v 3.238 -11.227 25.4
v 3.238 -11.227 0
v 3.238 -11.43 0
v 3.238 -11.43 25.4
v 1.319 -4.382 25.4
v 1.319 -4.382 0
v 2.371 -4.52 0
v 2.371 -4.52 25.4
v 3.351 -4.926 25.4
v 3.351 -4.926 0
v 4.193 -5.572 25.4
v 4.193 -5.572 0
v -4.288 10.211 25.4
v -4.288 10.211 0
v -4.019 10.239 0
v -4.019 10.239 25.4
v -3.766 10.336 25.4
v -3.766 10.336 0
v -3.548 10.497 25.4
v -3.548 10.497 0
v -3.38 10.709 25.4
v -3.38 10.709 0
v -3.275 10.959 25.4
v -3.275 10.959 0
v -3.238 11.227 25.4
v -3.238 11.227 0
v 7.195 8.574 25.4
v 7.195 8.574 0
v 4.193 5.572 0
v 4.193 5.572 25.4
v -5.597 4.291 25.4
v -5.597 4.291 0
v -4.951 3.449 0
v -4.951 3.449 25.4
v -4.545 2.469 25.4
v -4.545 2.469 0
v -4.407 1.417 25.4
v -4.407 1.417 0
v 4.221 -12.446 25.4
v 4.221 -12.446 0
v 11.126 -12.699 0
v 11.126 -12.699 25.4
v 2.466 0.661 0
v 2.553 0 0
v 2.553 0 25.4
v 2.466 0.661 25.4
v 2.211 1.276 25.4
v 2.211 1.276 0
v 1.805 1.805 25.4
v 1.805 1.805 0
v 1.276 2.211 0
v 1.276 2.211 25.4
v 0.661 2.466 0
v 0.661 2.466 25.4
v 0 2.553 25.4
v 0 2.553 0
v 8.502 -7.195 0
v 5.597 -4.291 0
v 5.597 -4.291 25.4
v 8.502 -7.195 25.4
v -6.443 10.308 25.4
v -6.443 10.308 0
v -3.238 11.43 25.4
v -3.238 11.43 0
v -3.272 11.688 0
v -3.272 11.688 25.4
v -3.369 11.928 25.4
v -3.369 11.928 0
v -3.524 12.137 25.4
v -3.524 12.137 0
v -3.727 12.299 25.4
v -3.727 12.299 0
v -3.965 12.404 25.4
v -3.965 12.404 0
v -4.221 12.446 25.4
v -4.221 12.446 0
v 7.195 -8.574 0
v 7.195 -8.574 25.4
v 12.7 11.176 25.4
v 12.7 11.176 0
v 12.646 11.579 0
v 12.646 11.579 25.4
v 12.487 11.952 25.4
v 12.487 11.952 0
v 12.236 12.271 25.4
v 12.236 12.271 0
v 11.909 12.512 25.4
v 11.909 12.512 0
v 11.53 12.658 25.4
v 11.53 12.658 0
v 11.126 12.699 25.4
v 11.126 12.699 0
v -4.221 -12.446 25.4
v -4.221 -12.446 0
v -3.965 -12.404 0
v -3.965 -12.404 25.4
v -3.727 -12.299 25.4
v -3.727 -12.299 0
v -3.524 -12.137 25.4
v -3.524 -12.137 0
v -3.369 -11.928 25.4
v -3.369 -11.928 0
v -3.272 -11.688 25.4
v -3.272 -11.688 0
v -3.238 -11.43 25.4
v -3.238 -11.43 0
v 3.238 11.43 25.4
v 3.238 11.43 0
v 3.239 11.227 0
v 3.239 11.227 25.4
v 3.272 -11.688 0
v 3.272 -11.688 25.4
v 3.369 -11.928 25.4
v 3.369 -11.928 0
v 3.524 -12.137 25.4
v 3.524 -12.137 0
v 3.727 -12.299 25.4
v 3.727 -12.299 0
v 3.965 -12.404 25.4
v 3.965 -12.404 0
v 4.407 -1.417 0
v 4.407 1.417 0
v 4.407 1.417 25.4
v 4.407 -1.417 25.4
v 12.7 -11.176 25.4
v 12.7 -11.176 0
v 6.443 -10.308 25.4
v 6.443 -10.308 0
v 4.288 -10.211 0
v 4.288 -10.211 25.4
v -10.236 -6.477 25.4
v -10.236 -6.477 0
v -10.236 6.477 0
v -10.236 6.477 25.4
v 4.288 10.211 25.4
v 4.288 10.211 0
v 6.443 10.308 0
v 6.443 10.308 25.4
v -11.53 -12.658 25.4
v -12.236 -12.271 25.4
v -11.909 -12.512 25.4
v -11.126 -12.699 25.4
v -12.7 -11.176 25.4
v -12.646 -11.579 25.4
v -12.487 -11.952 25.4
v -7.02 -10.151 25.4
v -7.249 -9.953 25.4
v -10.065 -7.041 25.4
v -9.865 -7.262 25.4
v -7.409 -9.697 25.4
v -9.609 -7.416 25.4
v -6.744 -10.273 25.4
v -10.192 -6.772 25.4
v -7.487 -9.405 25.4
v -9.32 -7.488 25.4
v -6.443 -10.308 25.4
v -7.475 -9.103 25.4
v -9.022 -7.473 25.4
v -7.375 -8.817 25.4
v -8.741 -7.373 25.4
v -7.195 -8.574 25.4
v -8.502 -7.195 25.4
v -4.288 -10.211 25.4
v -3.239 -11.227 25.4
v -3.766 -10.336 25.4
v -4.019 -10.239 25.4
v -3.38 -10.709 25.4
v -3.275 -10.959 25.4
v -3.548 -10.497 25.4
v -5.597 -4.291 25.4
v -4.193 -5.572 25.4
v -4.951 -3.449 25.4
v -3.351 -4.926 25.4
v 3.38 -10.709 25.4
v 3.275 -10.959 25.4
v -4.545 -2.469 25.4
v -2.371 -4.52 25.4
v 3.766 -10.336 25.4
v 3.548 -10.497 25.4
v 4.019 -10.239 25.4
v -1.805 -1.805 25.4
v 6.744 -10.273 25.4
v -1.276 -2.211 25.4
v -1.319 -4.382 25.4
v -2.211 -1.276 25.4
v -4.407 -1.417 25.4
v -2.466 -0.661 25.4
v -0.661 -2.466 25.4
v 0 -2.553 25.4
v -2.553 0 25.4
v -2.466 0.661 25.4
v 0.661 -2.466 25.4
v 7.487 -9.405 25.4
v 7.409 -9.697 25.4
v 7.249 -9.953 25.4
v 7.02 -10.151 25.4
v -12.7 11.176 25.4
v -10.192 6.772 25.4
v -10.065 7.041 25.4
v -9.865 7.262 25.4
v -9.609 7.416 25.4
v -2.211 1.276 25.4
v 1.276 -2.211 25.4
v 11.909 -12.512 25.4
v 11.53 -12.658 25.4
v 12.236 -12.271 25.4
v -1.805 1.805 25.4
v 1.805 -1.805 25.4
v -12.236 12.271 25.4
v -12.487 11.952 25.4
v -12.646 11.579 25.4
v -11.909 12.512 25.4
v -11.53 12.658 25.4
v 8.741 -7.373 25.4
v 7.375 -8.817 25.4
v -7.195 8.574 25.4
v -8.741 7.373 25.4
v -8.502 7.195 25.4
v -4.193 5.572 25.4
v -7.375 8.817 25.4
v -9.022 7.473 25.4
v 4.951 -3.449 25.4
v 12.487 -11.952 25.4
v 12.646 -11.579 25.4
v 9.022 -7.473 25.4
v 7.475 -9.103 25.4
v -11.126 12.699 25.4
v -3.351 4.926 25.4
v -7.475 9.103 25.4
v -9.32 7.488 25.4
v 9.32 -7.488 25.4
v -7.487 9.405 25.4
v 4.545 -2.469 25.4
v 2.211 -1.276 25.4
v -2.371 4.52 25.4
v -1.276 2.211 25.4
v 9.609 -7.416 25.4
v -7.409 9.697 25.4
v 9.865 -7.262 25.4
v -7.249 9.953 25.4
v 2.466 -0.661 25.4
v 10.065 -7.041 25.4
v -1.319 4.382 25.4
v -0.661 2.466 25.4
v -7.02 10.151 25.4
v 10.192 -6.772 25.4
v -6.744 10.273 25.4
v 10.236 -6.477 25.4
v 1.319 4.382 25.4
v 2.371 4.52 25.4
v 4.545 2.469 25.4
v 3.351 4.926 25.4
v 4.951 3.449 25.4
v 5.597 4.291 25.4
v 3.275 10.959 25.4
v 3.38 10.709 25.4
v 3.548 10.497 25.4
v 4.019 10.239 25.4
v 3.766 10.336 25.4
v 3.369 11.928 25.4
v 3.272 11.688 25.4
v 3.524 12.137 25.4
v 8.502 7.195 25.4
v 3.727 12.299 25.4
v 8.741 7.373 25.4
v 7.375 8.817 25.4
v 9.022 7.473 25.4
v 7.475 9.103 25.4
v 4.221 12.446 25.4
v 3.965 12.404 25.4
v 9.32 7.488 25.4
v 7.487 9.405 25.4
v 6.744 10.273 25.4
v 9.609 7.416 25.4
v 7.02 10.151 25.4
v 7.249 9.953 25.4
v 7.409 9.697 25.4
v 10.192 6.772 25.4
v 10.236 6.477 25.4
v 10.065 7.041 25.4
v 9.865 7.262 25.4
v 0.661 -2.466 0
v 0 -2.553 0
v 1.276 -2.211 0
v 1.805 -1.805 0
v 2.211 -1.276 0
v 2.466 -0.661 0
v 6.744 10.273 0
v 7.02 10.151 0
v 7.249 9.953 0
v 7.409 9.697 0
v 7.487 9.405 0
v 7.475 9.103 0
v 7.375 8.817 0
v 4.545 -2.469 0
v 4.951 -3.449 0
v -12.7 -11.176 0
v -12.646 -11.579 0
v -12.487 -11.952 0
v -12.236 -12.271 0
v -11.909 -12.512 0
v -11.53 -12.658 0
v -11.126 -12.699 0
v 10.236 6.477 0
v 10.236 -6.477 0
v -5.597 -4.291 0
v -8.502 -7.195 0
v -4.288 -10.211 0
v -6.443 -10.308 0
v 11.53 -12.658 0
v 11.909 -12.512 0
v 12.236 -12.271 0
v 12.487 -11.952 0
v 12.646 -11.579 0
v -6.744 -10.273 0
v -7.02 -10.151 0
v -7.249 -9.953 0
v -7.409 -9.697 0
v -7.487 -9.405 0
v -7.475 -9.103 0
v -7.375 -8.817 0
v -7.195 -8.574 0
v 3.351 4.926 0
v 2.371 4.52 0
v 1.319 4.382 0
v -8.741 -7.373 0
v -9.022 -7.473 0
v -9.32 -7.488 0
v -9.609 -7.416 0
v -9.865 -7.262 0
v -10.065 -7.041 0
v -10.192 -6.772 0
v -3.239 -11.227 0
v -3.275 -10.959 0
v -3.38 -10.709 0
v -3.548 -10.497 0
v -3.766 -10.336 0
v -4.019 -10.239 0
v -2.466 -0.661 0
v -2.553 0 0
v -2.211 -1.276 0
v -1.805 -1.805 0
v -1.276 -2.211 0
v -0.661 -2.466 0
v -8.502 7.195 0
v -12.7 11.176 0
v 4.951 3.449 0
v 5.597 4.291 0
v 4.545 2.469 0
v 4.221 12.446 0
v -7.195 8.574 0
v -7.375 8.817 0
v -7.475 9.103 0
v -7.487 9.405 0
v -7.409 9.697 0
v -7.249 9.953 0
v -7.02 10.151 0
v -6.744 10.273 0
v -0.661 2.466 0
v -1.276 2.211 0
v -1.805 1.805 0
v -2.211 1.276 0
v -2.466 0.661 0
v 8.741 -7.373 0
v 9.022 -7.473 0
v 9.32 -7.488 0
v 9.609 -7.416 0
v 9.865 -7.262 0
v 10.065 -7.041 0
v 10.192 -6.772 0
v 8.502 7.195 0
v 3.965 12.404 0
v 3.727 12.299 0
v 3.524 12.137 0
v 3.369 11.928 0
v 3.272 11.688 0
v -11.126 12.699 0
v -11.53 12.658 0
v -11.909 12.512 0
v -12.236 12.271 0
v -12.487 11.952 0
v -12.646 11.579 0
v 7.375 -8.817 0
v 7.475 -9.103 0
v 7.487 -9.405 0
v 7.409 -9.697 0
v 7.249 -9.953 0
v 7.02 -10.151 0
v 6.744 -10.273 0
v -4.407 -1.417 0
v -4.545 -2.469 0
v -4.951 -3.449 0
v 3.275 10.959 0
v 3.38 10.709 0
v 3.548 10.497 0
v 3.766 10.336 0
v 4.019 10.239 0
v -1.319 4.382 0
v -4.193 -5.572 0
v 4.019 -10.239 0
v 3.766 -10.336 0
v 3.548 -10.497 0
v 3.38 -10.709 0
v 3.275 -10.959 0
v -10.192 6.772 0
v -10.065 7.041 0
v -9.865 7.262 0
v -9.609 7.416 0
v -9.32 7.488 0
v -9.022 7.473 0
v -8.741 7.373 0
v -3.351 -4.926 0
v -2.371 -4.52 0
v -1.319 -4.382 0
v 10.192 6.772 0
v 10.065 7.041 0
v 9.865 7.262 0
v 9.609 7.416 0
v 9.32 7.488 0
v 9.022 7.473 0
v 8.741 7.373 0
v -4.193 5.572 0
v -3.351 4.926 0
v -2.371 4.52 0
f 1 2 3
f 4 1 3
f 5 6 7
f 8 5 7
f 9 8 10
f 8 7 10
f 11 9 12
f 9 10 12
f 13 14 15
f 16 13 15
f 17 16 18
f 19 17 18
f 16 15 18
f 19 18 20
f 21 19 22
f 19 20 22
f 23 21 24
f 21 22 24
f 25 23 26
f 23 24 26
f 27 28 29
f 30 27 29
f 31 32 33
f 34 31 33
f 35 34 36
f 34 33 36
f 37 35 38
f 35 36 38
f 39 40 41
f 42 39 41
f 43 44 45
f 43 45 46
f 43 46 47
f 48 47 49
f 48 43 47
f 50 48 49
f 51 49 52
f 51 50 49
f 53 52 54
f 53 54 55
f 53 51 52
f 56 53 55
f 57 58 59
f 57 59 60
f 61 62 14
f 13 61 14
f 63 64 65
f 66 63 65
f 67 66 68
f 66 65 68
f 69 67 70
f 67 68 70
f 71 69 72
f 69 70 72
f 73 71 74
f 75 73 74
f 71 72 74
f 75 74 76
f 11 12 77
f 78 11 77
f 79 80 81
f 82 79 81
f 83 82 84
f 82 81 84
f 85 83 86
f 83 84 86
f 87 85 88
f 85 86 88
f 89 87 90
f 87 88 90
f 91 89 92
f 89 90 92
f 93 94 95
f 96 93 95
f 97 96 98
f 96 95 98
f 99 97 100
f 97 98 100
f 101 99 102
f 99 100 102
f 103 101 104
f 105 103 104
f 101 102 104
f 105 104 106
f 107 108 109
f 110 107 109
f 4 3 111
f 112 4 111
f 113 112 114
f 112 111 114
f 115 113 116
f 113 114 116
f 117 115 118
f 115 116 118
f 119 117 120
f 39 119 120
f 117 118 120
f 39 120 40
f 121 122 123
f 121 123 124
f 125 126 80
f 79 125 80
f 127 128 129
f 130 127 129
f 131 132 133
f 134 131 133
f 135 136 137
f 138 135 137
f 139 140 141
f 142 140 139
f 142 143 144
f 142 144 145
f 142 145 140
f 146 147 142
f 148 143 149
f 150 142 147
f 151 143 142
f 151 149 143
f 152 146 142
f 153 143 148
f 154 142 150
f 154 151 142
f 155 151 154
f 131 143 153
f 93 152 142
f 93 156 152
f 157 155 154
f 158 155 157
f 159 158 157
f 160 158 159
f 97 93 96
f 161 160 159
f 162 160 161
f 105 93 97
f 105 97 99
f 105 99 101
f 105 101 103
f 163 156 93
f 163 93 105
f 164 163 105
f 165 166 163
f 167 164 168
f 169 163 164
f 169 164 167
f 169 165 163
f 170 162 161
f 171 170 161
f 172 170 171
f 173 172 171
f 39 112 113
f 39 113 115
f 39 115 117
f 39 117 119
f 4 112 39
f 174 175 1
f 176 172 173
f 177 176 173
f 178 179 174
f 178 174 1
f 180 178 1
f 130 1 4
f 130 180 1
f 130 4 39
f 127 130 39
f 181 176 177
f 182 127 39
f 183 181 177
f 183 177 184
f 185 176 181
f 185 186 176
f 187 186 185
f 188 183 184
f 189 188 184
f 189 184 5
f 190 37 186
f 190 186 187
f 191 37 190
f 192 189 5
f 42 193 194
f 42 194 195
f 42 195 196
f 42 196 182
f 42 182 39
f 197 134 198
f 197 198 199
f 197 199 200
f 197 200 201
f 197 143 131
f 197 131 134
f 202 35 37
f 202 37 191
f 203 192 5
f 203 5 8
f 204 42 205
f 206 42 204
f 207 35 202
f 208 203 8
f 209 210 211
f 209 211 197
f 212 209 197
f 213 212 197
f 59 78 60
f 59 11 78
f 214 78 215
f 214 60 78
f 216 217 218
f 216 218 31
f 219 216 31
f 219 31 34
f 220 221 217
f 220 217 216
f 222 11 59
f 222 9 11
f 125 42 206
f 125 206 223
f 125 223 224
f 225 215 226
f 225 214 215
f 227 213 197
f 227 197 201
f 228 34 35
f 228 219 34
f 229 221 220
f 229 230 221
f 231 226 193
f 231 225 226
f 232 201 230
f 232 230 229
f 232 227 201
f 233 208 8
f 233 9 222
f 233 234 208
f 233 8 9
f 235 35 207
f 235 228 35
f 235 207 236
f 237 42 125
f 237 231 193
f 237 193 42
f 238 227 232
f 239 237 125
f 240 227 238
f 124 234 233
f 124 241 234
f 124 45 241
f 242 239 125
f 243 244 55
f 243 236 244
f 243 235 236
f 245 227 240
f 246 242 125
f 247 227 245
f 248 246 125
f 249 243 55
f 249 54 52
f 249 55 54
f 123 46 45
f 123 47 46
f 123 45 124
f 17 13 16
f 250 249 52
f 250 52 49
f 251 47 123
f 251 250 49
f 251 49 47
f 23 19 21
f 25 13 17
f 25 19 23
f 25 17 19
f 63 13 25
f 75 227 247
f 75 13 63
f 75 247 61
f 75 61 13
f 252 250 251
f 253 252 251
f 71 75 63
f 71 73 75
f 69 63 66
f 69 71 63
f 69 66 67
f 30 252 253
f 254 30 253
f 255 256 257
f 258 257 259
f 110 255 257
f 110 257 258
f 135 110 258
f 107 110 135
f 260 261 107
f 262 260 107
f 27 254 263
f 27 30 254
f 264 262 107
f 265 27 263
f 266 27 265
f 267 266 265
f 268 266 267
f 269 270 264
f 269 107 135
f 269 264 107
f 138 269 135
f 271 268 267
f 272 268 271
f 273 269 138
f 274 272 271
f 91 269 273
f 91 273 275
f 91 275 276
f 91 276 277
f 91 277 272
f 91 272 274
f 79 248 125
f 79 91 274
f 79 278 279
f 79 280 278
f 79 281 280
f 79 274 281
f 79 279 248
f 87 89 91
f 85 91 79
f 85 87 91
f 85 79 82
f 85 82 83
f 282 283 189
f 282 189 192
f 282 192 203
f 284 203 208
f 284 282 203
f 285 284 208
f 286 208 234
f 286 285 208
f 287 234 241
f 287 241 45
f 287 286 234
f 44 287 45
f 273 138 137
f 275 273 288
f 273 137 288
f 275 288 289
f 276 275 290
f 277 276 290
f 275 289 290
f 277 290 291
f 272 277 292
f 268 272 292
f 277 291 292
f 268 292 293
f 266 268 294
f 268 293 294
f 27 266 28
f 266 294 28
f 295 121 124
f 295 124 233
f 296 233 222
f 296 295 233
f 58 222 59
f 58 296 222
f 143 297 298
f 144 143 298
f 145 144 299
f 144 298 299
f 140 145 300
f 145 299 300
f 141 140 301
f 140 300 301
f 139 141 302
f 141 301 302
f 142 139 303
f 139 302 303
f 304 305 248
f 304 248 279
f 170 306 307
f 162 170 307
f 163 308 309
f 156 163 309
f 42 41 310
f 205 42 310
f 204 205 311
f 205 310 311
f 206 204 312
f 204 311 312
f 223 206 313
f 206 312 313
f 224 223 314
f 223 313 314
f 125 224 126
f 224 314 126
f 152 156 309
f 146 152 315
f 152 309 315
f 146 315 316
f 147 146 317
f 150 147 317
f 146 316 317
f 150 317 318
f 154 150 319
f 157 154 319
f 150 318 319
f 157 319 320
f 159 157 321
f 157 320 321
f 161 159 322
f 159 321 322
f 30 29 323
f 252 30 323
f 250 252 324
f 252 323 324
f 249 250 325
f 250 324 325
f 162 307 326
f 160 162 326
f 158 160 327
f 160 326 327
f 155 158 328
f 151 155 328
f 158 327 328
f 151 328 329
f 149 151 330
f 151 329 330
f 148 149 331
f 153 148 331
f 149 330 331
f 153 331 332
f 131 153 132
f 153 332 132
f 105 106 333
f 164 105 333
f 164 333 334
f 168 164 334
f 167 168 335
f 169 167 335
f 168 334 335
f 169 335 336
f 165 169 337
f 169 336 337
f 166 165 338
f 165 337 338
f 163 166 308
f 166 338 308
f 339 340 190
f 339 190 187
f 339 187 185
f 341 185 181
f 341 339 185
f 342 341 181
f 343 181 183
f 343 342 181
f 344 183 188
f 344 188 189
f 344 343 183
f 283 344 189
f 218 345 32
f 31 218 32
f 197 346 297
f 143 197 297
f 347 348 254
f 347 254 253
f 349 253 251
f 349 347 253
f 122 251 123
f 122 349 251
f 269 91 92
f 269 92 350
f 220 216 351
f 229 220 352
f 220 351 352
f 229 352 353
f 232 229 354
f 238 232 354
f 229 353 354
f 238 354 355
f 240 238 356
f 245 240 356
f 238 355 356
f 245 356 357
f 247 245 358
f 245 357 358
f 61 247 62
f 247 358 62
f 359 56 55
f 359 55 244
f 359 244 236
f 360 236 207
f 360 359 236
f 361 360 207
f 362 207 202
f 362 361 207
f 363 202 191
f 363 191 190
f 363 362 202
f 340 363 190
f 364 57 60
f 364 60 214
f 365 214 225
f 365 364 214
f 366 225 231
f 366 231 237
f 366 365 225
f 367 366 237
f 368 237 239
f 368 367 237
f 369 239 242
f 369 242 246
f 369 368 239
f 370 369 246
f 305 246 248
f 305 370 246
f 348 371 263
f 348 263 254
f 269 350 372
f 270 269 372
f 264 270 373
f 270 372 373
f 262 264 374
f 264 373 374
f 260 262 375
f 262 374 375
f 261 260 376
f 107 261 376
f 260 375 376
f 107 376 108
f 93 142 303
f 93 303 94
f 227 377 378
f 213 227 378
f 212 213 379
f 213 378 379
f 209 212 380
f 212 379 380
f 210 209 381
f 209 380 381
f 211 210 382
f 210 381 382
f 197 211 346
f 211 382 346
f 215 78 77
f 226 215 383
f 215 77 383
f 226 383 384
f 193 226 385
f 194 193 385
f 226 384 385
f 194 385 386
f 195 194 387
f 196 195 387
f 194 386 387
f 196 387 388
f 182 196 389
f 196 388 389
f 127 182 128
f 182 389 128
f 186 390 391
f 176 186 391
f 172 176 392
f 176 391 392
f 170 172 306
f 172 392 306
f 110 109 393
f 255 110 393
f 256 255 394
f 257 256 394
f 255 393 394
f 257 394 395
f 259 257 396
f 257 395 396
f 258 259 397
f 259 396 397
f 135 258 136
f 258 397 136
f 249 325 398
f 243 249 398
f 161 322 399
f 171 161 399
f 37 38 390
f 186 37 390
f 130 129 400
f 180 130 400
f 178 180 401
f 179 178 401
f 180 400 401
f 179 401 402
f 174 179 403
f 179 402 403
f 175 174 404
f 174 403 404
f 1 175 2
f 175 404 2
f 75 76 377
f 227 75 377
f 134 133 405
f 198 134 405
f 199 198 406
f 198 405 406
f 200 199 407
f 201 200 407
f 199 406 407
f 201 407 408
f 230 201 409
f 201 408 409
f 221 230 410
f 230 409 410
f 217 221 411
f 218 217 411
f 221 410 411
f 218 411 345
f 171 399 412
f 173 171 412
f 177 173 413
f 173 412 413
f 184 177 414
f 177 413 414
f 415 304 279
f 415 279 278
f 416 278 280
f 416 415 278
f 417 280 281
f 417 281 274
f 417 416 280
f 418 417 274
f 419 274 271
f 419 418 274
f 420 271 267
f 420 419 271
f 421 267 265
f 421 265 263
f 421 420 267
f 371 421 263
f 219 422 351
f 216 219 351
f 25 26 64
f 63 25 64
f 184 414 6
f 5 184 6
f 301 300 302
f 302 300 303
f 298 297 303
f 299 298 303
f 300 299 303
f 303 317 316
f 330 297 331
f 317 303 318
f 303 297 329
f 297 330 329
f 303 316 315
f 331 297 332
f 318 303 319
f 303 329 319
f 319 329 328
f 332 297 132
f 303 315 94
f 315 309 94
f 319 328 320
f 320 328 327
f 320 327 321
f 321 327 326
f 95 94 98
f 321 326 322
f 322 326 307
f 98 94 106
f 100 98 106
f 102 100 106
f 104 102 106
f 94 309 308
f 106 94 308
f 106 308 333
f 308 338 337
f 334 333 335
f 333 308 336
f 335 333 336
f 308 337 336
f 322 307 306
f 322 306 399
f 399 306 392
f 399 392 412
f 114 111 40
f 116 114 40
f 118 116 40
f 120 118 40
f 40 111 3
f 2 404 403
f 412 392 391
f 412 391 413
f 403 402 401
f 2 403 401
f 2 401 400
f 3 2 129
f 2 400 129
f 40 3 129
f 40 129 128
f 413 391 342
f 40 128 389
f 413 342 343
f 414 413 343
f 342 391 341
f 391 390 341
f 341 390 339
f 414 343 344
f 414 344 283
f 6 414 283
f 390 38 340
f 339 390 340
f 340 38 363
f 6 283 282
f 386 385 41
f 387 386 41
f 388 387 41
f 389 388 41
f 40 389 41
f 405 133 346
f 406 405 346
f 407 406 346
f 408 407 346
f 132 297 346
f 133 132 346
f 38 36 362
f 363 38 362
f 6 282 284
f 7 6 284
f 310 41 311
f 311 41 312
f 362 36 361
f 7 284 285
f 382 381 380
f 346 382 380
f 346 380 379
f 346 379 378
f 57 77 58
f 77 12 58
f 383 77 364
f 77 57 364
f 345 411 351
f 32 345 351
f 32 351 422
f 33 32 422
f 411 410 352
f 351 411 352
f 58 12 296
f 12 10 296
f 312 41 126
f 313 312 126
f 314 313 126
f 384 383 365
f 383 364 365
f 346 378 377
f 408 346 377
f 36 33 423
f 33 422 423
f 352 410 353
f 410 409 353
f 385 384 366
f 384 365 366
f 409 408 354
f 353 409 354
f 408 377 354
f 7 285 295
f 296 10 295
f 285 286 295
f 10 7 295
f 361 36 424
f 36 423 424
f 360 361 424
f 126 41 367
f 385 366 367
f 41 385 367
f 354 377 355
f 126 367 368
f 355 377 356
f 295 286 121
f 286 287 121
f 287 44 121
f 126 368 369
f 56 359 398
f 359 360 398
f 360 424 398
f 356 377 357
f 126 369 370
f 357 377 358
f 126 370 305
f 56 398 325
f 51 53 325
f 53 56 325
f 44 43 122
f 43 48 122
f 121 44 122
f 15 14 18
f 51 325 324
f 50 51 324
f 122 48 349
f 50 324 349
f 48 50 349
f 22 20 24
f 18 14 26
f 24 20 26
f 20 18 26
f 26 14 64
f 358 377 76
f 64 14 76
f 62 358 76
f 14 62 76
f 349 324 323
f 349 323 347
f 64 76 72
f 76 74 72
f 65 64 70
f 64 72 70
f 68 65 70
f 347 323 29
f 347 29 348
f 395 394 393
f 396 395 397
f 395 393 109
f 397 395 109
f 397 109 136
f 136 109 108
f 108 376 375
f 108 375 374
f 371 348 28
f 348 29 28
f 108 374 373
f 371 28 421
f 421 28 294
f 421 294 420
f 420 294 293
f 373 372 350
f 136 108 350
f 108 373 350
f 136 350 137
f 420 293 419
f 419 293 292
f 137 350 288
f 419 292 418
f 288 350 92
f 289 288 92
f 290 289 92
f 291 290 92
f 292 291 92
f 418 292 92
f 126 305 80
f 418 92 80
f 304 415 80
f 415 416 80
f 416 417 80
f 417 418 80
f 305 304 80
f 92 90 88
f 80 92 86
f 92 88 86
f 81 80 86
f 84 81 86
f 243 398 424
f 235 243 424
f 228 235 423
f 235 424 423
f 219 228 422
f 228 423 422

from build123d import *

# Parameters (mm, degrees)
EXTRUDE1_DEPTH = 25.4


with BuildPart() as part:
    # Sketch1 → Extrude1 (new body)
    with BuildSketch(Plane.XY):
        with BuildLine():
            Line((11.125675541, 12.699168884), (4.22095036, 12.445641481))
            ThreePointArc((4.22095036, 12.445641481), (3.524314259, 12.136654887), (3.2385, 11.430195559))
            Line((3.2385, 11.430195559), (3.2385, 11.226884683))
            ThreePointArc((3.2385, 11.226884683), (3.548040671, 10.496698941), (4.28804964, 10.21143876))
            Line((4.28804964, 10.21143876), (6.44345036, 10.308051727))
            ThreePointArc((6.44345036, 10.308051727), (7.4091133, 9.696859185), (7.19542049, 8.574185315))
            Line((7.19542049, 8.574185315), (4.193053216, 5.571818041))
            ThreePointArc((4.193053216, 5.571818041), (2.874596726, 4.69085358), (1.319371257, 4.3815))
            Line((1.319371257, 4.3815), (-1.319371257, 4.3815))
            ThreePointArc((-1.319371257, 4.3815), (-2.874596726, 4.69085358), (-4.193053216, 5.571818041))
            Line((-4.193053216, 5.571818041), (-7.19542049, 8.574185315))
            ThreePointArc((-7.19542049, 8.574185315), (-7.4091133, 9.696859185), (-6.44345036, 10.308051727))
            Line((-6.44345036, 10.308051727), (-4.28804964, 10.21143876))
            ThreePointArc((-4.28804964, 10.21143876), (-3.548040671, 10.496698941), (-3.2385, 11.226884683))
            Line((-3.2385, 11.226884683), (-3.2385, 11.430195559))
            ThreePointArc((-3.2385, 11.430195559), (-3.524314259, 12.136654887), (-4.22095036, 12.445641481))
            Line((-4.22095036, 12.445641481), (-11.125675541, 12.699168884))
            ThreePointArc((-11.125675541, 12.699168884), (-12.235688993, 12.271278612), (-12.7, 11.176))
            Line((-12.7, 11.176), (-12.7, 0))
            Line((-12.7, 0), (-12.7, -11.176))
            ThreePointArc((-12.7, -11.176), (-12.235688993, -12.271278612), (-11.125675541, -12.699168884))
            Line((-11.125675541, -12.699168884), (-4.22095036, -12.445641481))
            ThreePointArc((-4.22095036, -12.445641481), (-3.524314259, -12.136654887), (-3.2385, -11.430195559))
            Line((-3.2385, -11.430195559), (-3.2385, -11.226884683))
            ThreePointArc((-3.2385, -11.226884683), (-3.548040671, -10.496698941), (-4.28804964, -10.21143876))
            Line((-4.28804964, -10.21143876), (-6.44345036, -10.308051727))
            ThreePointArc((-6.44345036, -10.308051727), (-7.4091133, -9.696859185), (-7.19542049, -8.574185315))
            Line((-7.19542049, -8.574185315), (-4.193053216, -5.571818041))
            ThreePointArc((-4.193053216, -5.571818041), (-2.874596726, -4.69085358), (-1.319371257, -4.3815))
            Line((-1.319371257, -4.3815), (1.319371257, -4.3815))
            ThreePointArc((1.319371257, -4.3815), (2.874596726, -4.69085358), (4.193053216, -5.571818041))
            Line((4.193053216, -5.571818041), (7.19542049, -8.574185315))
            ThreePointArc((7.19542049, -8.574185315), (7.4091133, -9.696859185), (6.44345036, -10.308051727))
            Line((6.44345036, -10.308051727), (4.28804964, -10.21143876))
            ThreePointArc((4.28804964, -10.21143876), (3.548040671, -10.496698941), (3.2385, -11.226884683))
            Line((3.2385, -11.226884683), (3.2385, -11.430195559))
            ThreePointArc((3.2385, -11.430195559), (3.524314259, -12.136654887), (4.22095036, -12.445641481))
            Line((4.22095036, -12.445641481), (11.125675541, -12.699168884))
            ThreePointArc((11.125675541, -12.699168884), (12.235688993, -12.271278612), (12.7, -11.176))
            Line((12.7, -11.176), (12.7, 0))
            Line((12.7, 0), (12.7, 11.176))
            ThreePointArc((12.7, 11.176), (12.235688993, 12.271278612), (11.125675541, 12.699168884))
        make_face()
        with BuildLine():
            Line((-8.50177951, 7.19542049), (-5.597218041, 4.290859021))
            ThreePointArc((-5.597218041, 4.290859021), (-4.71625358, 2.972402531), (-4.4069, 1.417177062))
            Line((-4.4069, 1.417177062), (-4.4069, -1.417177062))
            ThreePointArc((-4.4069, -1.417177062), (-4.71625358, -2.972402531), (-5.597218041, -4.290859021))
            Line((-5.597218041, -4.290859021), (-8.50177951, -7.19542049))
            ThreePointArc((-8.50177951, -7.19542049), (-9.609006367, -7.415661605), (-10.2362, -6.477))
            Line((-10.2362, -6.477), (-10.2362, 0))
            Line((-10.2362, 0), (-10.2362, 6.477))
            ThreePointArc((-10.2362, 6.477), (-9.609006367, 7.415661605), (-8.50177951, 7.19542049))
        make_face(mode=Mode.SUBTRACT)
        with BuildLine():
            Line((10.2362, 0), (10.2362, 6.477))
            ThreePointArc((10.2362, 6.477), (9.609006367, 7.415661605), (8.50177951, 7.19542049))
            Line((8.50177951, 7.19542049), (5.597218041, 4.290859021))
            ThreePointArc((5.597218041, 4.290859021), (4.71625358, 2.972402531), (4.4069, 1.417177062))
            Line((4.4069, 1.417177062), (4.4069, -1.417177062))
            ThreePointArc((4.4069, -1.417177062), (4.71625358, -2.972402531), (5.597218041, -4.290859021))
            Line((5.597218041, -4.290859021), (8.50177951, -7.19542049))
            ThreePointArc((8.50177951, -7.19542049), (9.609006367, -7.415661605), (10.2362, -6.477))
            Line((10.2362, -6.477), (10.2362, 0))
        make_face(mode=Mode.SUBTRACT)
        with BuildLine():
            ThreePointArc((0, 2.5527), (-1.80503148, 1.80503148), (-2.5527, 0))
            ThreePointArc((-2.5527, 0), (-1.80503148, -1.80503148), (0, -2.5527))
            ThreePointArc((0, -2.5527), (1.80503148, -1.80503148), (2.5527, 0))
            ThreePointArc((2.5527, 0), (1.80503148, 1.80503148), (0, 2.5527))
        make_face(mode=Mode.SUBTRACT)
    extrude(amount=EXTRUDE1_DEPTH)


solid = part.part
